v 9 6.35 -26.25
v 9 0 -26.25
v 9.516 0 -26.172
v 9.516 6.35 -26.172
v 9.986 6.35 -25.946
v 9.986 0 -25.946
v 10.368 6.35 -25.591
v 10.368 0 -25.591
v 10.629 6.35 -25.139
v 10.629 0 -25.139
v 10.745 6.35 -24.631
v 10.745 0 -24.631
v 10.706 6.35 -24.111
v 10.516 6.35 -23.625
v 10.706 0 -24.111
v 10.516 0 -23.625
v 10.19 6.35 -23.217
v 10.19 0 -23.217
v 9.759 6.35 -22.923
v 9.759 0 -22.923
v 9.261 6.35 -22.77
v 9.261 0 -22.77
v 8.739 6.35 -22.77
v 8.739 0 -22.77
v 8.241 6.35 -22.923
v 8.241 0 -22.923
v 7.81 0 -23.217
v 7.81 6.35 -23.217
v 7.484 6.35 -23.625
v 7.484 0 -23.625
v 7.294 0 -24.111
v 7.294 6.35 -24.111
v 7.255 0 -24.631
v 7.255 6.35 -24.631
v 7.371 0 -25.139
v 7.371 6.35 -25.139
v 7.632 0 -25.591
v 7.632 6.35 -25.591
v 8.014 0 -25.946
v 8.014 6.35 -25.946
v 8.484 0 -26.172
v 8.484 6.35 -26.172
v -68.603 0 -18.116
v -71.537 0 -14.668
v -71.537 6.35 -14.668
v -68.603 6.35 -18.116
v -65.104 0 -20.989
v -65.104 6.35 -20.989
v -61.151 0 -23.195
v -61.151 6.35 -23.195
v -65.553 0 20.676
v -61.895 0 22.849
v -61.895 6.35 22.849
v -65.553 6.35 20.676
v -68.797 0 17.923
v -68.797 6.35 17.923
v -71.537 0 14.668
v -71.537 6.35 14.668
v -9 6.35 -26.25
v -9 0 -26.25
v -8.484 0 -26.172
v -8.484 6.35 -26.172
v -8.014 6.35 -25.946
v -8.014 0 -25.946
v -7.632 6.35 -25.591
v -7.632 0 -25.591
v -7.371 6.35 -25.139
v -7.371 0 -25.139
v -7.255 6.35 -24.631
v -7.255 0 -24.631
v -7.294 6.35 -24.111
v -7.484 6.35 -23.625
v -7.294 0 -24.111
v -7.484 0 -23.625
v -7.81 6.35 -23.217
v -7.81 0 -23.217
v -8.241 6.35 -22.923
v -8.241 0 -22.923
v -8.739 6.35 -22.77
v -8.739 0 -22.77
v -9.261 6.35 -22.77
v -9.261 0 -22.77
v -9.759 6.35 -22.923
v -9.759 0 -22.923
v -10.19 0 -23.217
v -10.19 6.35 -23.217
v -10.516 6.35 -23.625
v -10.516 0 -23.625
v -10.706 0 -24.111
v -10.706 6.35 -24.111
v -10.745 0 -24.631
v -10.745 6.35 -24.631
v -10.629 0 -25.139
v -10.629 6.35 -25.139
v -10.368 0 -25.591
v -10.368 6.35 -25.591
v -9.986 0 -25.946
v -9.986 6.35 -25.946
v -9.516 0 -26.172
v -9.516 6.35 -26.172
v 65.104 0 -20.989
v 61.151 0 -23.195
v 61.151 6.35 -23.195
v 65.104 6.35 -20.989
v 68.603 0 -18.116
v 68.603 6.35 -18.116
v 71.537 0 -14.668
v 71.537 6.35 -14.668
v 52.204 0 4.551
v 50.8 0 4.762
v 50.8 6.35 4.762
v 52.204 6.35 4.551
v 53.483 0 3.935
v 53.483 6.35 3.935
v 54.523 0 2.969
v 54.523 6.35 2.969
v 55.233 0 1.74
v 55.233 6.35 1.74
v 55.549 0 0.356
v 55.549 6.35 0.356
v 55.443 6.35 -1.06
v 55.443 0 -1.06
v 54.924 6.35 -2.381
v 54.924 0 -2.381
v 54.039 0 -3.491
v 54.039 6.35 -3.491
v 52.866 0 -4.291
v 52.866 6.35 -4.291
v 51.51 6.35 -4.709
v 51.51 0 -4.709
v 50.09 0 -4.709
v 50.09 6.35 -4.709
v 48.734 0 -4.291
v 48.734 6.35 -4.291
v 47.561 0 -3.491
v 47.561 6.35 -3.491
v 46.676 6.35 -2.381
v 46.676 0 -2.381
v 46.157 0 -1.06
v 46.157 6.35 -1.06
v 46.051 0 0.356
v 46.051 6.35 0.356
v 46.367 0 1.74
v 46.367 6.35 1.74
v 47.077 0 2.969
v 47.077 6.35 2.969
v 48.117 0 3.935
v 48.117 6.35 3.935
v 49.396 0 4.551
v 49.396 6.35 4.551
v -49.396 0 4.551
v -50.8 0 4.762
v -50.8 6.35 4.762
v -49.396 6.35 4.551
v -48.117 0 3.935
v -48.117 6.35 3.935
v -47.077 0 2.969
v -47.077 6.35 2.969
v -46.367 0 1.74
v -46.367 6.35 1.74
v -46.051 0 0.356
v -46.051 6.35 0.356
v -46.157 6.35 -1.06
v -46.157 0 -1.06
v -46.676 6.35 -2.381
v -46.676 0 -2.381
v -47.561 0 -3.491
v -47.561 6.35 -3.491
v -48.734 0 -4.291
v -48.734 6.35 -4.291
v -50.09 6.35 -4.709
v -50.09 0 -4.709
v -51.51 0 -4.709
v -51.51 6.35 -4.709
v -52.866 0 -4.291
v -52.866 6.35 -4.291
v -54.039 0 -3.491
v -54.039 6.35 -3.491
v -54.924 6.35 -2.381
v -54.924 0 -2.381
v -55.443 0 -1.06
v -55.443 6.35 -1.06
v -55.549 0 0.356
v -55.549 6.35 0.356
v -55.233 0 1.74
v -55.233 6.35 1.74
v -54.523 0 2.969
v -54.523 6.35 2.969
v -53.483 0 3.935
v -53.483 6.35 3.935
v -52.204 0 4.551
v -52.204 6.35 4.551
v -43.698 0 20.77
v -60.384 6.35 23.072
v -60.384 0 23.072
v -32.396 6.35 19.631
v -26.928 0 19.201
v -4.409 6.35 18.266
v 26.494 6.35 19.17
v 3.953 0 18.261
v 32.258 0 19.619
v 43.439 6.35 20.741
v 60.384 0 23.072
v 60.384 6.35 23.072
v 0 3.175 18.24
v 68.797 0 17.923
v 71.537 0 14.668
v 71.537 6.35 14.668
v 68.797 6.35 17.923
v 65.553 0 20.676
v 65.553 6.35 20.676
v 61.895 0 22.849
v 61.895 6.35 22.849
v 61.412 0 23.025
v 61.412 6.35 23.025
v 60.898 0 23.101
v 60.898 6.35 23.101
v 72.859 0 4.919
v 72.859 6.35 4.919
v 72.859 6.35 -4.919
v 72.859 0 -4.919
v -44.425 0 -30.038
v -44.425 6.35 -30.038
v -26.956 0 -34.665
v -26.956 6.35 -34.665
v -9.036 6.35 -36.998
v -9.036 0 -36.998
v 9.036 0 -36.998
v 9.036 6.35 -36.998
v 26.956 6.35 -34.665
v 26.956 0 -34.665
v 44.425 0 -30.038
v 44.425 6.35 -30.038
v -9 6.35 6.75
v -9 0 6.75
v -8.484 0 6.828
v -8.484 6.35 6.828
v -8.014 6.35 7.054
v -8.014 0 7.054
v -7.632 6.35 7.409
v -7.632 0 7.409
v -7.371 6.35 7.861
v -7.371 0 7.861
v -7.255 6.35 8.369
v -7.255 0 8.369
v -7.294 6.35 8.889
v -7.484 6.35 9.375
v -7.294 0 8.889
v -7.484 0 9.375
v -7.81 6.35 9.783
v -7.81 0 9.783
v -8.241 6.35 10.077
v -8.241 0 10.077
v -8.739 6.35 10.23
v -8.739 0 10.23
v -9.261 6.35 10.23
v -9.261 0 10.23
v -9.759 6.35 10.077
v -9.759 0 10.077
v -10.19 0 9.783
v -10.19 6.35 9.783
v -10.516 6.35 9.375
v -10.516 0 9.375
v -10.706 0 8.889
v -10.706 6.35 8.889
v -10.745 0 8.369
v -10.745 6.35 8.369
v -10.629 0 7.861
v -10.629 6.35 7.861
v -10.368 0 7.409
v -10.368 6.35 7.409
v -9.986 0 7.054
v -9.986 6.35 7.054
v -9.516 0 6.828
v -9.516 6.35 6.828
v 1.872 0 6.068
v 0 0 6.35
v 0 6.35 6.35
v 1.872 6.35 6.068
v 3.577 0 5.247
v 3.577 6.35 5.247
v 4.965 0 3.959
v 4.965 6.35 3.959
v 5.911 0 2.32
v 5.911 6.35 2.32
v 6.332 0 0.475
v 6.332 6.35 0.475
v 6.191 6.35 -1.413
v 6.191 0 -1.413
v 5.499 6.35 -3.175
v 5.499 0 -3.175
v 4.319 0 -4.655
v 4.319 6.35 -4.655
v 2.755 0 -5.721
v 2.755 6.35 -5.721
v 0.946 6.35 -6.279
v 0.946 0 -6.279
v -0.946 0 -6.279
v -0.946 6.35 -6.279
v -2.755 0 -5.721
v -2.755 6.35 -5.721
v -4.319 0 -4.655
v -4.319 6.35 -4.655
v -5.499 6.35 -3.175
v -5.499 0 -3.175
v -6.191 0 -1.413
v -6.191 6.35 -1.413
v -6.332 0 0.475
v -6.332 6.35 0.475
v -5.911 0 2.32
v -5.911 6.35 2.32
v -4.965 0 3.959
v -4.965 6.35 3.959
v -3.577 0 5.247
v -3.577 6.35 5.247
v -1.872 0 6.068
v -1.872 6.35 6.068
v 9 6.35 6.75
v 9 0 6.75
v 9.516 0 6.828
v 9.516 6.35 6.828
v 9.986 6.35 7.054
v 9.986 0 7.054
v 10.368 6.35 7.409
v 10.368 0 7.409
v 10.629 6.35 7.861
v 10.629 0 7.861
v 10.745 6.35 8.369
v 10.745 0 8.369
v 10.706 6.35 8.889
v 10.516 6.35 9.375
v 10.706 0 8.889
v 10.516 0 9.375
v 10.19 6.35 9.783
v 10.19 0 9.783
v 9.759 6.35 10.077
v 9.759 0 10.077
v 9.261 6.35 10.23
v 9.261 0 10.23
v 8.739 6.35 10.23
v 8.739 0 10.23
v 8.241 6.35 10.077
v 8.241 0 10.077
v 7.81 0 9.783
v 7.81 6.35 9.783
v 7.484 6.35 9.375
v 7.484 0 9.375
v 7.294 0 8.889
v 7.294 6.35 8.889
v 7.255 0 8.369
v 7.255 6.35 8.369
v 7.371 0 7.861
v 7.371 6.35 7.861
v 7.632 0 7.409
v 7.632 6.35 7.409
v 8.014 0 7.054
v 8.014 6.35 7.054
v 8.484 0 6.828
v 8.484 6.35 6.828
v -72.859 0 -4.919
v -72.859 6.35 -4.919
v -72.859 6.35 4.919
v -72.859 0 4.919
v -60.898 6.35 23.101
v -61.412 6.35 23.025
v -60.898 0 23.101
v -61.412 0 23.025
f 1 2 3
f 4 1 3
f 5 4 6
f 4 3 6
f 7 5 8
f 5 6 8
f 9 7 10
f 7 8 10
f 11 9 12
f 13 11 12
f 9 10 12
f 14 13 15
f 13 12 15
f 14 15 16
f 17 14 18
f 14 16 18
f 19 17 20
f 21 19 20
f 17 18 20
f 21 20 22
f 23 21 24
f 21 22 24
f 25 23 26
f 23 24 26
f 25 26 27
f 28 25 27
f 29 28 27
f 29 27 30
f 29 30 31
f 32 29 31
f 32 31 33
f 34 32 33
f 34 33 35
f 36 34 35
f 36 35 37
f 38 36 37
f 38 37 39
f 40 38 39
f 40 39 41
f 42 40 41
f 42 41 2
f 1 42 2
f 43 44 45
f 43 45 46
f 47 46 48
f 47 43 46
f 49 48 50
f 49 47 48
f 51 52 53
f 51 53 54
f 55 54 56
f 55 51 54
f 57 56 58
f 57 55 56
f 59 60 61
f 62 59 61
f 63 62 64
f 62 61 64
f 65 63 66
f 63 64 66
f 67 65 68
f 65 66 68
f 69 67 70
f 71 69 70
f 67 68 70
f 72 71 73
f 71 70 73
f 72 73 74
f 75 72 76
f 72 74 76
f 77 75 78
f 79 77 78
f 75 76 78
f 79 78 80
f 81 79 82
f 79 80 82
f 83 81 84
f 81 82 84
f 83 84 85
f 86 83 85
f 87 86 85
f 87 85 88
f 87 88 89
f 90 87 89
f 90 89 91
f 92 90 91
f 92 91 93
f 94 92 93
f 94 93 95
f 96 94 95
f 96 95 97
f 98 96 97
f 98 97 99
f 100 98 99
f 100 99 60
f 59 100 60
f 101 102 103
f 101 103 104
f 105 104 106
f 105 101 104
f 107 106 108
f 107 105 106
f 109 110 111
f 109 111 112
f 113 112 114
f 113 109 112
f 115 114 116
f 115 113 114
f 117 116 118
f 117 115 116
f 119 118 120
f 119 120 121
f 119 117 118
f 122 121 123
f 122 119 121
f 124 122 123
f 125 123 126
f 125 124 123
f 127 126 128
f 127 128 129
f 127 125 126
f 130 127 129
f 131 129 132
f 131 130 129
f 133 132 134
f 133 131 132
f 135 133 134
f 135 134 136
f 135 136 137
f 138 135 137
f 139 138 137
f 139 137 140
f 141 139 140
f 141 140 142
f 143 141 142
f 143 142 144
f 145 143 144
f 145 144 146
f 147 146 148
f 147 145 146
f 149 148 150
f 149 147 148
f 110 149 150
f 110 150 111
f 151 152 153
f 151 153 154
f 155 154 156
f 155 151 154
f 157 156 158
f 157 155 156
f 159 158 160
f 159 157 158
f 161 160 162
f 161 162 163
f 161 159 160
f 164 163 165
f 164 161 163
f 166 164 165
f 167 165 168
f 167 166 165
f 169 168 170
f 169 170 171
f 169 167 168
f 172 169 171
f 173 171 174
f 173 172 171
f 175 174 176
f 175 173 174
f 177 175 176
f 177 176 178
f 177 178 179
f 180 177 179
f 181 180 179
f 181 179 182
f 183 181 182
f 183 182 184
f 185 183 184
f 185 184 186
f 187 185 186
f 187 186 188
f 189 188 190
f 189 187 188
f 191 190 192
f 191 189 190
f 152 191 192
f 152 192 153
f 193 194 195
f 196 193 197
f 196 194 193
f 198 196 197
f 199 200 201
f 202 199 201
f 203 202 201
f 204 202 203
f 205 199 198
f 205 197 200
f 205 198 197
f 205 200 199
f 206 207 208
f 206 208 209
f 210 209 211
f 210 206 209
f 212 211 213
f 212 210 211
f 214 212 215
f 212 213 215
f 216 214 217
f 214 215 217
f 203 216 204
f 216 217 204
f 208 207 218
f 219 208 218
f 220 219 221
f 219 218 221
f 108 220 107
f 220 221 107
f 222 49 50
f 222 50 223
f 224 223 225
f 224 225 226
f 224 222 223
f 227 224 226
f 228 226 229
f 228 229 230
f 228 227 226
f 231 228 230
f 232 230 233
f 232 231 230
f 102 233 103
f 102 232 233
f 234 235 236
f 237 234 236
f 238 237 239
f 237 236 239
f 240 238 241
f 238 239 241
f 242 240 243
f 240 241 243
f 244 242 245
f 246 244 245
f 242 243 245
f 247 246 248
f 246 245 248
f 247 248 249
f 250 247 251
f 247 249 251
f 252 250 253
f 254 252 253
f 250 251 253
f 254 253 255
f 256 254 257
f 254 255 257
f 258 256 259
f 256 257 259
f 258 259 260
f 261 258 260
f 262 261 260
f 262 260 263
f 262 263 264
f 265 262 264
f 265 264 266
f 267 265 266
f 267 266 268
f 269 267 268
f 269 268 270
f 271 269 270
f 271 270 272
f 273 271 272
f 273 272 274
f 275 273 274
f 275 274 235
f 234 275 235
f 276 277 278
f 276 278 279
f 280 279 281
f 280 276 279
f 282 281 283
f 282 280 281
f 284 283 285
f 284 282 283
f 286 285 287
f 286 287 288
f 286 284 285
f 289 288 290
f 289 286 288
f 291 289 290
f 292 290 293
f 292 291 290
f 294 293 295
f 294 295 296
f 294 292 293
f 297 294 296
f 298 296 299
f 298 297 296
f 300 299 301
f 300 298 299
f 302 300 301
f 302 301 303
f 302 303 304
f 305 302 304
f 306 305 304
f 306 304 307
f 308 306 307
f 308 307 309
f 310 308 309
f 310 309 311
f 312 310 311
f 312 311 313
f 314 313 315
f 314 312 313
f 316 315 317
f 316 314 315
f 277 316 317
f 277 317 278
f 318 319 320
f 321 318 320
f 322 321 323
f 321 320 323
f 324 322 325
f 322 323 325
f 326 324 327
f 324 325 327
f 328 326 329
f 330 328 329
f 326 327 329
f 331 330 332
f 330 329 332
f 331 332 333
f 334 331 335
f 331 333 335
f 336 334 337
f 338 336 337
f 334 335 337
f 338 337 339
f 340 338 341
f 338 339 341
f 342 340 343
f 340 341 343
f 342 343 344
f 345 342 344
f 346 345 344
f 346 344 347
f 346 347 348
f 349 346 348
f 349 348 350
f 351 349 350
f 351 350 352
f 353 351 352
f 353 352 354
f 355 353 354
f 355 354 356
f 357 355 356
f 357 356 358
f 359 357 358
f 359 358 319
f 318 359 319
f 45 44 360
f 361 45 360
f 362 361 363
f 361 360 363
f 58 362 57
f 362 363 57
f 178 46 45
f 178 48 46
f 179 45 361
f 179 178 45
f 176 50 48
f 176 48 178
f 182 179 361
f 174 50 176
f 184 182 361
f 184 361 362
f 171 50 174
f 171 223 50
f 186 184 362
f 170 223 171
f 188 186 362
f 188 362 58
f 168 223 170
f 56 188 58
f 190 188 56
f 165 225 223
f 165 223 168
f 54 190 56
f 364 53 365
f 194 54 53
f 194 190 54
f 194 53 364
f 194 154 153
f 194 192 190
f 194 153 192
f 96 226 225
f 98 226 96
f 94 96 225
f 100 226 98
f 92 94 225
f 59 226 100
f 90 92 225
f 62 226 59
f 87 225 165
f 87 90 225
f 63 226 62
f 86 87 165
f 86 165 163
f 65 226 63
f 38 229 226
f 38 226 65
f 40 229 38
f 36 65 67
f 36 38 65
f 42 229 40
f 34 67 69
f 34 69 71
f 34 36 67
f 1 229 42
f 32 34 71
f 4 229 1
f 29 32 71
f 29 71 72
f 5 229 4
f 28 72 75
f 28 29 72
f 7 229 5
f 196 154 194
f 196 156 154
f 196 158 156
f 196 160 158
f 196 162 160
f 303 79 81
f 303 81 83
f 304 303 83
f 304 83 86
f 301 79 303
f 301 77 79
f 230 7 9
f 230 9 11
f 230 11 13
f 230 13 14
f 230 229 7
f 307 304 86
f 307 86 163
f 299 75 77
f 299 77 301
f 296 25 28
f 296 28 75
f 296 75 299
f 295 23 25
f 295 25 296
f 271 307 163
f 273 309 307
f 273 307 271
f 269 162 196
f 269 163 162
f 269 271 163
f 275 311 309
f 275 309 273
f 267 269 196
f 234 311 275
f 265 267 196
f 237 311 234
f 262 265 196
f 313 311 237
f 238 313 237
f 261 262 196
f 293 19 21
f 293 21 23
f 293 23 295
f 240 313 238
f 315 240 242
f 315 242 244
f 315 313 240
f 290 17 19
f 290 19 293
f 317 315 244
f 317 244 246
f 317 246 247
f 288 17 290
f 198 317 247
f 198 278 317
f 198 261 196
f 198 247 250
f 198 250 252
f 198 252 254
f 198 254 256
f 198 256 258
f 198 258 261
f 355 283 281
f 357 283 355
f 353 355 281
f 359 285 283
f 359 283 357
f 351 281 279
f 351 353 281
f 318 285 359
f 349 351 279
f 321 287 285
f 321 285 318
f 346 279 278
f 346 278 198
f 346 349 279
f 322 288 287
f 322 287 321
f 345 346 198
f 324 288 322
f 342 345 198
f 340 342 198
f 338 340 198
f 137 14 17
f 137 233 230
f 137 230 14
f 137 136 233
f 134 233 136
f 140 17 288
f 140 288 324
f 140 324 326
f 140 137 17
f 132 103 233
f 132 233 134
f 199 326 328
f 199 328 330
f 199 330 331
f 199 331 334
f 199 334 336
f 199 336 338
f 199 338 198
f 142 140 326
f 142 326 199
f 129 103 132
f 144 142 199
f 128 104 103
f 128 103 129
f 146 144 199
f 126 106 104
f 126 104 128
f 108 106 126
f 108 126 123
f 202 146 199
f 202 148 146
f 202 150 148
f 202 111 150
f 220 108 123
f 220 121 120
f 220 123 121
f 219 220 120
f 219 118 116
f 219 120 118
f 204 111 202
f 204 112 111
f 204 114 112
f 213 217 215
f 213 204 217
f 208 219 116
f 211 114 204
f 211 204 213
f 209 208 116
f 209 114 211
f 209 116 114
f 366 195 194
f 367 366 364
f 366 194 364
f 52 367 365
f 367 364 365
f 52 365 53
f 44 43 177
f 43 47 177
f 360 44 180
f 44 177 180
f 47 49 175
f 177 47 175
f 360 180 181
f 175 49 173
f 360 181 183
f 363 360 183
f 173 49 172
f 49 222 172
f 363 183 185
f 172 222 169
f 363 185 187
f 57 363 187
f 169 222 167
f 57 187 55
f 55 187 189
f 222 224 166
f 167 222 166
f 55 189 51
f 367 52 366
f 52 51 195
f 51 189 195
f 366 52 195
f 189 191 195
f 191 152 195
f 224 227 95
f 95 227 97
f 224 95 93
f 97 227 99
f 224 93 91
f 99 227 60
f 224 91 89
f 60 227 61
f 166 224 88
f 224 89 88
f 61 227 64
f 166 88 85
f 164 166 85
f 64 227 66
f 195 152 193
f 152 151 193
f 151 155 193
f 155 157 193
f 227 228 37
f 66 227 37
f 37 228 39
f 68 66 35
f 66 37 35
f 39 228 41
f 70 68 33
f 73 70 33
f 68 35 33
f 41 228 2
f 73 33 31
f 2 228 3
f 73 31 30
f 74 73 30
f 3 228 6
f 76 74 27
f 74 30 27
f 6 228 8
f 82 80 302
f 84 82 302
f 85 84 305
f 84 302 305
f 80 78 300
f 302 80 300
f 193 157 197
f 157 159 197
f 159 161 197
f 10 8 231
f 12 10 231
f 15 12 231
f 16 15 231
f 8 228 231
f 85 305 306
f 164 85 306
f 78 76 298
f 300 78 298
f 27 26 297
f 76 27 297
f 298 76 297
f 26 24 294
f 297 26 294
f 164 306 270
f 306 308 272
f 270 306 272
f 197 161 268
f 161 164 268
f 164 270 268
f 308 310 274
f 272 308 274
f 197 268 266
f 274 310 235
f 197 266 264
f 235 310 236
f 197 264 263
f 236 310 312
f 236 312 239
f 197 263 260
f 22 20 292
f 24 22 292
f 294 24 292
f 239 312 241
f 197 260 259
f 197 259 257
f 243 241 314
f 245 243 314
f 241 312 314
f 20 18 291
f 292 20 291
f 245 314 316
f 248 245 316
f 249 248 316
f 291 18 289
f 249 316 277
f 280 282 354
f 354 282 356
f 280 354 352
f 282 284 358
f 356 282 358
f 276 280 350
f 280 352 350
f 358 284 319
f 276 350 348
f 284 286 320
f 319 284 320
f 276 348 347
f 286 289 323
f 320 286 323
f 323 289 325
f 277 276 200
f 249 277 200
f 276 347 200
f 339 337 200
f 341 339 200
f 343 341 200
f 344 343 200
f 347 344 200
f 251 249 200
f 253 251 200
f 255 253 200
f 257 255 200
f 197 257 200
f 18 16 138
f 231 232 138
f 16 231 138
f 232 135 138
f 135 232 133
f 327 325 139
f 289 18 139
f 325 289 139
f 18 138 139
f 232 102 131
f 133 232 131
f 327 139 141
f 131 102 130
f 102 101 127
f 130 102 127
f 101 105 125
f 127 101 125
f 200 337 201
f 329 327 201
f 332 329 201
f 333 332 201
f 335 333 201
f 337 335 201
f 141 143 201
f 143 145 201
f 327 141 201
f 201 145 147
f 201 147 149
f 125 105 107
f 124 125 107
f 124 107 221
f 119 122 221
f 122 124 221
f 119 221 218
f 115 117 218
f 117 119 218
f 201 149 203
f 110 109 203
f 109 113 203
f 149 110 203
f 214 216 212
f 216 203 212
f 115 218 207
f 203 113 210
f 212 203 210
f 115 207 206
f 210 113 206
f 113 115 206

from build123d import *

# Parameters (mm, degrees)
SKETCH1_R           = 73.025
BOSS_EXTRUDE1_DEPTH = 6.35
CUT_EXTRUDE2_START  = -6.35
SKETCH2_R           = 4.7625
SKETCH2_R_2         = 6.35
CUT_EXTRUDE2_DEPTH  = 6.35
SKETCH3_R           = 1.75
SKETCH3_R_2         = 1.5
CUT_EXTRUDE3_DEPTH  = 10
CUT_EXTRUDE7_DEPTH  = 83.240634572
FILLET1_R           = 2.54


with BuildPart() as part:
    # Sketch1 → Boss-Extrude1 (new body)
    with BuildSketch(Plane(origin=(0, 0, 0), x_dir=(1, 0, 0), z_dir=(0, 1, 0))):
        with Locations(Location((0, 0, 0), (0, 0, 270))):
            Circle(SKETCH1_R)
    extrude(amount=BOSS_EXTRUDE1_DEPTH)

    # Sketch2 → Cut-Extrude2 (cut)
    with BuildSketch(Plane(origin=(0, 6.35, 0), x_dir=(1, 0, 0), z_dir=(0, 1, 0)).offset(CUT_EXTRUDE2_START)):
        with BuildLine():
            ThreePointArc((61.150770614, -23.195291499), (0, -37.290063688), (-61.150770614, -23.195291499))
            ThreePointArc((-61.150770614, -23.195291499), (-66.917906968, -19.630921399), (-71.53671875, -14.667941079))
            ThreePointArc((-71.53671875, -14.667941079), (0, -73.025), (71.53671875, -14.667941079))
            ThreePointArc((71.53671875, -14.667941079), (66.917906968, -19.630921399), (61.150770614, -23.195291499))
        make_face()
        with BuildLine():
            ThreePointArc((-61.150770614, 23.195291499), (0, 37.290063688), (61.150770614, 23.195291499))
            ThreePointArc((61.150770614, 23.195291499), (66.917906968, 19.630921399), (71.53671875, 14.667941079))
            ThreePointArc((71.53671875, 14.667941079), (0, 73.025), (-71.53671875, 14.667941079))
            ThreePointArc((-71.53671875, 14.667941079), (-66.917906968, 19.630921399), (-61.150770614, 23.195291499))
        make_face()
        with Locations(Location((-50.8, 0, 0), (0, 0, 270))):
            Circle(SKETCH2_R)
        with Locations(Location((50.8, 0, 0), (0, 0, 270))):
            Circle(SKETCH2_R)
        with Locations(Location((0, 0, 0), (0, 0, 270))):
            Circle(SKETCH2_R_2)
    extrude(amount=CUT_EXTRUDE2_DEPTH, mode=Mode.SUBTRACT)

    # Sketch3 → Cut-Extrude3 (cut)
    # profile 1 of 8: a face of its own
    with BuildSketch(Plane.XZ):
        with Locations(Location((-9, 8.5, 0), (0, 0, 270))):
            Circle(SKETCH3_R)
        with Locations((-9, 8.5)):
            Circle(SKETCH3_R_2, mode=Mode.SUBTRACT)
    # profile 2 of 8: a face of its own
    with BuildSketch(Plane.XZ):
        with Locations((-9, 8.5)):
            Circle(SKETCH3_R_2)
    # profile 3 of 8: a face of its own
    with BuildSketch(Plane.XZ):
        with Locations(Location((-9, -24.5, 0), (0, 0, 270))):
            Circle(SKETCH3_R)
        with Locations((-9, -24.5)):
            Circle(SKETCH3_R_2, mode=Mode.SUBTRACT)
    # profile 4 of 8: a face of its own
    with BuildSketch(Plane.XZ):
        with Locations((-9, -24.5)):
            Circle(SKETCH3_R_2)
    # profile 5 of 8: a face of its own
    with BuildSketch(Plane.XZ):
        with Locations(Location((9, -24.5, 0), (0, 0, 270))):
            Circle(SKETCH3_R)
        with Locations((9, -24.5)):
            Circle(SKETCH3_R_2, mode=Mode.SUBTRACT)
    # profile 6 of 8: a face of its own
    with BuildSketch(Plane.XZ):
        with Locations((9, -24.5)):
            Circle(SKETCH3_R_2)
    # profile 7 of 8: a face of its own
    with BuildSketch(Plane.XZ):
        with Locations(Location((9, 8.5, 0), (0, 0, 270))):
            Circle(SKETCH3_R)
        with Locations((9, 8.5)):
            Circle(SKETCH3_R_2, mode=Mode.SUBTRACT)
    # profile 8 of 8: a face of its own
    with BuildSketch(Plane.XZ):
        with Locations((9, 8.5)):
            Circle(SKETCH3_R_2)
    extrude(amount=-CUT_EXTRUDE3_DEPTH, mode=Mode.SUBTRACT)

    # Sketch5 → Cut-Extrude7 (cut, through all)
    with BuildSketch(Plane(origin=(0, 6.35, 0), x_dir=(1, 0, 0), z_dir=(0, 1, 0))):
        with BuildLine():
            add(Edge.make_bspline(
                [(-61.150770614, -23.195291499), (0, -13.284835877), (61.150770614, -23.195291499)],
                knots=[0, 0, 0, 1, 1, 1], degree=2))
            ThreePointArc((-61.150770614, -23.195291499), (0, -37.290063688), (61.150770614, -23.195291499))
        make_face()
    extrude(amount=-CUT_EXTRUDE7_DEPTH, mode=Mode.SUBTRACT)

    # Fillet1
    fillet1_edges = [part.edges().sort_by_distance(p)[0] for p in [
        (61.150770614, 3.175, 23.195291499),
        (-61.150770614, 3.175, 23.195291499),
    ]]
    fillet(fillet1_edges, radius=FILLET1_R)


solid = part.part
